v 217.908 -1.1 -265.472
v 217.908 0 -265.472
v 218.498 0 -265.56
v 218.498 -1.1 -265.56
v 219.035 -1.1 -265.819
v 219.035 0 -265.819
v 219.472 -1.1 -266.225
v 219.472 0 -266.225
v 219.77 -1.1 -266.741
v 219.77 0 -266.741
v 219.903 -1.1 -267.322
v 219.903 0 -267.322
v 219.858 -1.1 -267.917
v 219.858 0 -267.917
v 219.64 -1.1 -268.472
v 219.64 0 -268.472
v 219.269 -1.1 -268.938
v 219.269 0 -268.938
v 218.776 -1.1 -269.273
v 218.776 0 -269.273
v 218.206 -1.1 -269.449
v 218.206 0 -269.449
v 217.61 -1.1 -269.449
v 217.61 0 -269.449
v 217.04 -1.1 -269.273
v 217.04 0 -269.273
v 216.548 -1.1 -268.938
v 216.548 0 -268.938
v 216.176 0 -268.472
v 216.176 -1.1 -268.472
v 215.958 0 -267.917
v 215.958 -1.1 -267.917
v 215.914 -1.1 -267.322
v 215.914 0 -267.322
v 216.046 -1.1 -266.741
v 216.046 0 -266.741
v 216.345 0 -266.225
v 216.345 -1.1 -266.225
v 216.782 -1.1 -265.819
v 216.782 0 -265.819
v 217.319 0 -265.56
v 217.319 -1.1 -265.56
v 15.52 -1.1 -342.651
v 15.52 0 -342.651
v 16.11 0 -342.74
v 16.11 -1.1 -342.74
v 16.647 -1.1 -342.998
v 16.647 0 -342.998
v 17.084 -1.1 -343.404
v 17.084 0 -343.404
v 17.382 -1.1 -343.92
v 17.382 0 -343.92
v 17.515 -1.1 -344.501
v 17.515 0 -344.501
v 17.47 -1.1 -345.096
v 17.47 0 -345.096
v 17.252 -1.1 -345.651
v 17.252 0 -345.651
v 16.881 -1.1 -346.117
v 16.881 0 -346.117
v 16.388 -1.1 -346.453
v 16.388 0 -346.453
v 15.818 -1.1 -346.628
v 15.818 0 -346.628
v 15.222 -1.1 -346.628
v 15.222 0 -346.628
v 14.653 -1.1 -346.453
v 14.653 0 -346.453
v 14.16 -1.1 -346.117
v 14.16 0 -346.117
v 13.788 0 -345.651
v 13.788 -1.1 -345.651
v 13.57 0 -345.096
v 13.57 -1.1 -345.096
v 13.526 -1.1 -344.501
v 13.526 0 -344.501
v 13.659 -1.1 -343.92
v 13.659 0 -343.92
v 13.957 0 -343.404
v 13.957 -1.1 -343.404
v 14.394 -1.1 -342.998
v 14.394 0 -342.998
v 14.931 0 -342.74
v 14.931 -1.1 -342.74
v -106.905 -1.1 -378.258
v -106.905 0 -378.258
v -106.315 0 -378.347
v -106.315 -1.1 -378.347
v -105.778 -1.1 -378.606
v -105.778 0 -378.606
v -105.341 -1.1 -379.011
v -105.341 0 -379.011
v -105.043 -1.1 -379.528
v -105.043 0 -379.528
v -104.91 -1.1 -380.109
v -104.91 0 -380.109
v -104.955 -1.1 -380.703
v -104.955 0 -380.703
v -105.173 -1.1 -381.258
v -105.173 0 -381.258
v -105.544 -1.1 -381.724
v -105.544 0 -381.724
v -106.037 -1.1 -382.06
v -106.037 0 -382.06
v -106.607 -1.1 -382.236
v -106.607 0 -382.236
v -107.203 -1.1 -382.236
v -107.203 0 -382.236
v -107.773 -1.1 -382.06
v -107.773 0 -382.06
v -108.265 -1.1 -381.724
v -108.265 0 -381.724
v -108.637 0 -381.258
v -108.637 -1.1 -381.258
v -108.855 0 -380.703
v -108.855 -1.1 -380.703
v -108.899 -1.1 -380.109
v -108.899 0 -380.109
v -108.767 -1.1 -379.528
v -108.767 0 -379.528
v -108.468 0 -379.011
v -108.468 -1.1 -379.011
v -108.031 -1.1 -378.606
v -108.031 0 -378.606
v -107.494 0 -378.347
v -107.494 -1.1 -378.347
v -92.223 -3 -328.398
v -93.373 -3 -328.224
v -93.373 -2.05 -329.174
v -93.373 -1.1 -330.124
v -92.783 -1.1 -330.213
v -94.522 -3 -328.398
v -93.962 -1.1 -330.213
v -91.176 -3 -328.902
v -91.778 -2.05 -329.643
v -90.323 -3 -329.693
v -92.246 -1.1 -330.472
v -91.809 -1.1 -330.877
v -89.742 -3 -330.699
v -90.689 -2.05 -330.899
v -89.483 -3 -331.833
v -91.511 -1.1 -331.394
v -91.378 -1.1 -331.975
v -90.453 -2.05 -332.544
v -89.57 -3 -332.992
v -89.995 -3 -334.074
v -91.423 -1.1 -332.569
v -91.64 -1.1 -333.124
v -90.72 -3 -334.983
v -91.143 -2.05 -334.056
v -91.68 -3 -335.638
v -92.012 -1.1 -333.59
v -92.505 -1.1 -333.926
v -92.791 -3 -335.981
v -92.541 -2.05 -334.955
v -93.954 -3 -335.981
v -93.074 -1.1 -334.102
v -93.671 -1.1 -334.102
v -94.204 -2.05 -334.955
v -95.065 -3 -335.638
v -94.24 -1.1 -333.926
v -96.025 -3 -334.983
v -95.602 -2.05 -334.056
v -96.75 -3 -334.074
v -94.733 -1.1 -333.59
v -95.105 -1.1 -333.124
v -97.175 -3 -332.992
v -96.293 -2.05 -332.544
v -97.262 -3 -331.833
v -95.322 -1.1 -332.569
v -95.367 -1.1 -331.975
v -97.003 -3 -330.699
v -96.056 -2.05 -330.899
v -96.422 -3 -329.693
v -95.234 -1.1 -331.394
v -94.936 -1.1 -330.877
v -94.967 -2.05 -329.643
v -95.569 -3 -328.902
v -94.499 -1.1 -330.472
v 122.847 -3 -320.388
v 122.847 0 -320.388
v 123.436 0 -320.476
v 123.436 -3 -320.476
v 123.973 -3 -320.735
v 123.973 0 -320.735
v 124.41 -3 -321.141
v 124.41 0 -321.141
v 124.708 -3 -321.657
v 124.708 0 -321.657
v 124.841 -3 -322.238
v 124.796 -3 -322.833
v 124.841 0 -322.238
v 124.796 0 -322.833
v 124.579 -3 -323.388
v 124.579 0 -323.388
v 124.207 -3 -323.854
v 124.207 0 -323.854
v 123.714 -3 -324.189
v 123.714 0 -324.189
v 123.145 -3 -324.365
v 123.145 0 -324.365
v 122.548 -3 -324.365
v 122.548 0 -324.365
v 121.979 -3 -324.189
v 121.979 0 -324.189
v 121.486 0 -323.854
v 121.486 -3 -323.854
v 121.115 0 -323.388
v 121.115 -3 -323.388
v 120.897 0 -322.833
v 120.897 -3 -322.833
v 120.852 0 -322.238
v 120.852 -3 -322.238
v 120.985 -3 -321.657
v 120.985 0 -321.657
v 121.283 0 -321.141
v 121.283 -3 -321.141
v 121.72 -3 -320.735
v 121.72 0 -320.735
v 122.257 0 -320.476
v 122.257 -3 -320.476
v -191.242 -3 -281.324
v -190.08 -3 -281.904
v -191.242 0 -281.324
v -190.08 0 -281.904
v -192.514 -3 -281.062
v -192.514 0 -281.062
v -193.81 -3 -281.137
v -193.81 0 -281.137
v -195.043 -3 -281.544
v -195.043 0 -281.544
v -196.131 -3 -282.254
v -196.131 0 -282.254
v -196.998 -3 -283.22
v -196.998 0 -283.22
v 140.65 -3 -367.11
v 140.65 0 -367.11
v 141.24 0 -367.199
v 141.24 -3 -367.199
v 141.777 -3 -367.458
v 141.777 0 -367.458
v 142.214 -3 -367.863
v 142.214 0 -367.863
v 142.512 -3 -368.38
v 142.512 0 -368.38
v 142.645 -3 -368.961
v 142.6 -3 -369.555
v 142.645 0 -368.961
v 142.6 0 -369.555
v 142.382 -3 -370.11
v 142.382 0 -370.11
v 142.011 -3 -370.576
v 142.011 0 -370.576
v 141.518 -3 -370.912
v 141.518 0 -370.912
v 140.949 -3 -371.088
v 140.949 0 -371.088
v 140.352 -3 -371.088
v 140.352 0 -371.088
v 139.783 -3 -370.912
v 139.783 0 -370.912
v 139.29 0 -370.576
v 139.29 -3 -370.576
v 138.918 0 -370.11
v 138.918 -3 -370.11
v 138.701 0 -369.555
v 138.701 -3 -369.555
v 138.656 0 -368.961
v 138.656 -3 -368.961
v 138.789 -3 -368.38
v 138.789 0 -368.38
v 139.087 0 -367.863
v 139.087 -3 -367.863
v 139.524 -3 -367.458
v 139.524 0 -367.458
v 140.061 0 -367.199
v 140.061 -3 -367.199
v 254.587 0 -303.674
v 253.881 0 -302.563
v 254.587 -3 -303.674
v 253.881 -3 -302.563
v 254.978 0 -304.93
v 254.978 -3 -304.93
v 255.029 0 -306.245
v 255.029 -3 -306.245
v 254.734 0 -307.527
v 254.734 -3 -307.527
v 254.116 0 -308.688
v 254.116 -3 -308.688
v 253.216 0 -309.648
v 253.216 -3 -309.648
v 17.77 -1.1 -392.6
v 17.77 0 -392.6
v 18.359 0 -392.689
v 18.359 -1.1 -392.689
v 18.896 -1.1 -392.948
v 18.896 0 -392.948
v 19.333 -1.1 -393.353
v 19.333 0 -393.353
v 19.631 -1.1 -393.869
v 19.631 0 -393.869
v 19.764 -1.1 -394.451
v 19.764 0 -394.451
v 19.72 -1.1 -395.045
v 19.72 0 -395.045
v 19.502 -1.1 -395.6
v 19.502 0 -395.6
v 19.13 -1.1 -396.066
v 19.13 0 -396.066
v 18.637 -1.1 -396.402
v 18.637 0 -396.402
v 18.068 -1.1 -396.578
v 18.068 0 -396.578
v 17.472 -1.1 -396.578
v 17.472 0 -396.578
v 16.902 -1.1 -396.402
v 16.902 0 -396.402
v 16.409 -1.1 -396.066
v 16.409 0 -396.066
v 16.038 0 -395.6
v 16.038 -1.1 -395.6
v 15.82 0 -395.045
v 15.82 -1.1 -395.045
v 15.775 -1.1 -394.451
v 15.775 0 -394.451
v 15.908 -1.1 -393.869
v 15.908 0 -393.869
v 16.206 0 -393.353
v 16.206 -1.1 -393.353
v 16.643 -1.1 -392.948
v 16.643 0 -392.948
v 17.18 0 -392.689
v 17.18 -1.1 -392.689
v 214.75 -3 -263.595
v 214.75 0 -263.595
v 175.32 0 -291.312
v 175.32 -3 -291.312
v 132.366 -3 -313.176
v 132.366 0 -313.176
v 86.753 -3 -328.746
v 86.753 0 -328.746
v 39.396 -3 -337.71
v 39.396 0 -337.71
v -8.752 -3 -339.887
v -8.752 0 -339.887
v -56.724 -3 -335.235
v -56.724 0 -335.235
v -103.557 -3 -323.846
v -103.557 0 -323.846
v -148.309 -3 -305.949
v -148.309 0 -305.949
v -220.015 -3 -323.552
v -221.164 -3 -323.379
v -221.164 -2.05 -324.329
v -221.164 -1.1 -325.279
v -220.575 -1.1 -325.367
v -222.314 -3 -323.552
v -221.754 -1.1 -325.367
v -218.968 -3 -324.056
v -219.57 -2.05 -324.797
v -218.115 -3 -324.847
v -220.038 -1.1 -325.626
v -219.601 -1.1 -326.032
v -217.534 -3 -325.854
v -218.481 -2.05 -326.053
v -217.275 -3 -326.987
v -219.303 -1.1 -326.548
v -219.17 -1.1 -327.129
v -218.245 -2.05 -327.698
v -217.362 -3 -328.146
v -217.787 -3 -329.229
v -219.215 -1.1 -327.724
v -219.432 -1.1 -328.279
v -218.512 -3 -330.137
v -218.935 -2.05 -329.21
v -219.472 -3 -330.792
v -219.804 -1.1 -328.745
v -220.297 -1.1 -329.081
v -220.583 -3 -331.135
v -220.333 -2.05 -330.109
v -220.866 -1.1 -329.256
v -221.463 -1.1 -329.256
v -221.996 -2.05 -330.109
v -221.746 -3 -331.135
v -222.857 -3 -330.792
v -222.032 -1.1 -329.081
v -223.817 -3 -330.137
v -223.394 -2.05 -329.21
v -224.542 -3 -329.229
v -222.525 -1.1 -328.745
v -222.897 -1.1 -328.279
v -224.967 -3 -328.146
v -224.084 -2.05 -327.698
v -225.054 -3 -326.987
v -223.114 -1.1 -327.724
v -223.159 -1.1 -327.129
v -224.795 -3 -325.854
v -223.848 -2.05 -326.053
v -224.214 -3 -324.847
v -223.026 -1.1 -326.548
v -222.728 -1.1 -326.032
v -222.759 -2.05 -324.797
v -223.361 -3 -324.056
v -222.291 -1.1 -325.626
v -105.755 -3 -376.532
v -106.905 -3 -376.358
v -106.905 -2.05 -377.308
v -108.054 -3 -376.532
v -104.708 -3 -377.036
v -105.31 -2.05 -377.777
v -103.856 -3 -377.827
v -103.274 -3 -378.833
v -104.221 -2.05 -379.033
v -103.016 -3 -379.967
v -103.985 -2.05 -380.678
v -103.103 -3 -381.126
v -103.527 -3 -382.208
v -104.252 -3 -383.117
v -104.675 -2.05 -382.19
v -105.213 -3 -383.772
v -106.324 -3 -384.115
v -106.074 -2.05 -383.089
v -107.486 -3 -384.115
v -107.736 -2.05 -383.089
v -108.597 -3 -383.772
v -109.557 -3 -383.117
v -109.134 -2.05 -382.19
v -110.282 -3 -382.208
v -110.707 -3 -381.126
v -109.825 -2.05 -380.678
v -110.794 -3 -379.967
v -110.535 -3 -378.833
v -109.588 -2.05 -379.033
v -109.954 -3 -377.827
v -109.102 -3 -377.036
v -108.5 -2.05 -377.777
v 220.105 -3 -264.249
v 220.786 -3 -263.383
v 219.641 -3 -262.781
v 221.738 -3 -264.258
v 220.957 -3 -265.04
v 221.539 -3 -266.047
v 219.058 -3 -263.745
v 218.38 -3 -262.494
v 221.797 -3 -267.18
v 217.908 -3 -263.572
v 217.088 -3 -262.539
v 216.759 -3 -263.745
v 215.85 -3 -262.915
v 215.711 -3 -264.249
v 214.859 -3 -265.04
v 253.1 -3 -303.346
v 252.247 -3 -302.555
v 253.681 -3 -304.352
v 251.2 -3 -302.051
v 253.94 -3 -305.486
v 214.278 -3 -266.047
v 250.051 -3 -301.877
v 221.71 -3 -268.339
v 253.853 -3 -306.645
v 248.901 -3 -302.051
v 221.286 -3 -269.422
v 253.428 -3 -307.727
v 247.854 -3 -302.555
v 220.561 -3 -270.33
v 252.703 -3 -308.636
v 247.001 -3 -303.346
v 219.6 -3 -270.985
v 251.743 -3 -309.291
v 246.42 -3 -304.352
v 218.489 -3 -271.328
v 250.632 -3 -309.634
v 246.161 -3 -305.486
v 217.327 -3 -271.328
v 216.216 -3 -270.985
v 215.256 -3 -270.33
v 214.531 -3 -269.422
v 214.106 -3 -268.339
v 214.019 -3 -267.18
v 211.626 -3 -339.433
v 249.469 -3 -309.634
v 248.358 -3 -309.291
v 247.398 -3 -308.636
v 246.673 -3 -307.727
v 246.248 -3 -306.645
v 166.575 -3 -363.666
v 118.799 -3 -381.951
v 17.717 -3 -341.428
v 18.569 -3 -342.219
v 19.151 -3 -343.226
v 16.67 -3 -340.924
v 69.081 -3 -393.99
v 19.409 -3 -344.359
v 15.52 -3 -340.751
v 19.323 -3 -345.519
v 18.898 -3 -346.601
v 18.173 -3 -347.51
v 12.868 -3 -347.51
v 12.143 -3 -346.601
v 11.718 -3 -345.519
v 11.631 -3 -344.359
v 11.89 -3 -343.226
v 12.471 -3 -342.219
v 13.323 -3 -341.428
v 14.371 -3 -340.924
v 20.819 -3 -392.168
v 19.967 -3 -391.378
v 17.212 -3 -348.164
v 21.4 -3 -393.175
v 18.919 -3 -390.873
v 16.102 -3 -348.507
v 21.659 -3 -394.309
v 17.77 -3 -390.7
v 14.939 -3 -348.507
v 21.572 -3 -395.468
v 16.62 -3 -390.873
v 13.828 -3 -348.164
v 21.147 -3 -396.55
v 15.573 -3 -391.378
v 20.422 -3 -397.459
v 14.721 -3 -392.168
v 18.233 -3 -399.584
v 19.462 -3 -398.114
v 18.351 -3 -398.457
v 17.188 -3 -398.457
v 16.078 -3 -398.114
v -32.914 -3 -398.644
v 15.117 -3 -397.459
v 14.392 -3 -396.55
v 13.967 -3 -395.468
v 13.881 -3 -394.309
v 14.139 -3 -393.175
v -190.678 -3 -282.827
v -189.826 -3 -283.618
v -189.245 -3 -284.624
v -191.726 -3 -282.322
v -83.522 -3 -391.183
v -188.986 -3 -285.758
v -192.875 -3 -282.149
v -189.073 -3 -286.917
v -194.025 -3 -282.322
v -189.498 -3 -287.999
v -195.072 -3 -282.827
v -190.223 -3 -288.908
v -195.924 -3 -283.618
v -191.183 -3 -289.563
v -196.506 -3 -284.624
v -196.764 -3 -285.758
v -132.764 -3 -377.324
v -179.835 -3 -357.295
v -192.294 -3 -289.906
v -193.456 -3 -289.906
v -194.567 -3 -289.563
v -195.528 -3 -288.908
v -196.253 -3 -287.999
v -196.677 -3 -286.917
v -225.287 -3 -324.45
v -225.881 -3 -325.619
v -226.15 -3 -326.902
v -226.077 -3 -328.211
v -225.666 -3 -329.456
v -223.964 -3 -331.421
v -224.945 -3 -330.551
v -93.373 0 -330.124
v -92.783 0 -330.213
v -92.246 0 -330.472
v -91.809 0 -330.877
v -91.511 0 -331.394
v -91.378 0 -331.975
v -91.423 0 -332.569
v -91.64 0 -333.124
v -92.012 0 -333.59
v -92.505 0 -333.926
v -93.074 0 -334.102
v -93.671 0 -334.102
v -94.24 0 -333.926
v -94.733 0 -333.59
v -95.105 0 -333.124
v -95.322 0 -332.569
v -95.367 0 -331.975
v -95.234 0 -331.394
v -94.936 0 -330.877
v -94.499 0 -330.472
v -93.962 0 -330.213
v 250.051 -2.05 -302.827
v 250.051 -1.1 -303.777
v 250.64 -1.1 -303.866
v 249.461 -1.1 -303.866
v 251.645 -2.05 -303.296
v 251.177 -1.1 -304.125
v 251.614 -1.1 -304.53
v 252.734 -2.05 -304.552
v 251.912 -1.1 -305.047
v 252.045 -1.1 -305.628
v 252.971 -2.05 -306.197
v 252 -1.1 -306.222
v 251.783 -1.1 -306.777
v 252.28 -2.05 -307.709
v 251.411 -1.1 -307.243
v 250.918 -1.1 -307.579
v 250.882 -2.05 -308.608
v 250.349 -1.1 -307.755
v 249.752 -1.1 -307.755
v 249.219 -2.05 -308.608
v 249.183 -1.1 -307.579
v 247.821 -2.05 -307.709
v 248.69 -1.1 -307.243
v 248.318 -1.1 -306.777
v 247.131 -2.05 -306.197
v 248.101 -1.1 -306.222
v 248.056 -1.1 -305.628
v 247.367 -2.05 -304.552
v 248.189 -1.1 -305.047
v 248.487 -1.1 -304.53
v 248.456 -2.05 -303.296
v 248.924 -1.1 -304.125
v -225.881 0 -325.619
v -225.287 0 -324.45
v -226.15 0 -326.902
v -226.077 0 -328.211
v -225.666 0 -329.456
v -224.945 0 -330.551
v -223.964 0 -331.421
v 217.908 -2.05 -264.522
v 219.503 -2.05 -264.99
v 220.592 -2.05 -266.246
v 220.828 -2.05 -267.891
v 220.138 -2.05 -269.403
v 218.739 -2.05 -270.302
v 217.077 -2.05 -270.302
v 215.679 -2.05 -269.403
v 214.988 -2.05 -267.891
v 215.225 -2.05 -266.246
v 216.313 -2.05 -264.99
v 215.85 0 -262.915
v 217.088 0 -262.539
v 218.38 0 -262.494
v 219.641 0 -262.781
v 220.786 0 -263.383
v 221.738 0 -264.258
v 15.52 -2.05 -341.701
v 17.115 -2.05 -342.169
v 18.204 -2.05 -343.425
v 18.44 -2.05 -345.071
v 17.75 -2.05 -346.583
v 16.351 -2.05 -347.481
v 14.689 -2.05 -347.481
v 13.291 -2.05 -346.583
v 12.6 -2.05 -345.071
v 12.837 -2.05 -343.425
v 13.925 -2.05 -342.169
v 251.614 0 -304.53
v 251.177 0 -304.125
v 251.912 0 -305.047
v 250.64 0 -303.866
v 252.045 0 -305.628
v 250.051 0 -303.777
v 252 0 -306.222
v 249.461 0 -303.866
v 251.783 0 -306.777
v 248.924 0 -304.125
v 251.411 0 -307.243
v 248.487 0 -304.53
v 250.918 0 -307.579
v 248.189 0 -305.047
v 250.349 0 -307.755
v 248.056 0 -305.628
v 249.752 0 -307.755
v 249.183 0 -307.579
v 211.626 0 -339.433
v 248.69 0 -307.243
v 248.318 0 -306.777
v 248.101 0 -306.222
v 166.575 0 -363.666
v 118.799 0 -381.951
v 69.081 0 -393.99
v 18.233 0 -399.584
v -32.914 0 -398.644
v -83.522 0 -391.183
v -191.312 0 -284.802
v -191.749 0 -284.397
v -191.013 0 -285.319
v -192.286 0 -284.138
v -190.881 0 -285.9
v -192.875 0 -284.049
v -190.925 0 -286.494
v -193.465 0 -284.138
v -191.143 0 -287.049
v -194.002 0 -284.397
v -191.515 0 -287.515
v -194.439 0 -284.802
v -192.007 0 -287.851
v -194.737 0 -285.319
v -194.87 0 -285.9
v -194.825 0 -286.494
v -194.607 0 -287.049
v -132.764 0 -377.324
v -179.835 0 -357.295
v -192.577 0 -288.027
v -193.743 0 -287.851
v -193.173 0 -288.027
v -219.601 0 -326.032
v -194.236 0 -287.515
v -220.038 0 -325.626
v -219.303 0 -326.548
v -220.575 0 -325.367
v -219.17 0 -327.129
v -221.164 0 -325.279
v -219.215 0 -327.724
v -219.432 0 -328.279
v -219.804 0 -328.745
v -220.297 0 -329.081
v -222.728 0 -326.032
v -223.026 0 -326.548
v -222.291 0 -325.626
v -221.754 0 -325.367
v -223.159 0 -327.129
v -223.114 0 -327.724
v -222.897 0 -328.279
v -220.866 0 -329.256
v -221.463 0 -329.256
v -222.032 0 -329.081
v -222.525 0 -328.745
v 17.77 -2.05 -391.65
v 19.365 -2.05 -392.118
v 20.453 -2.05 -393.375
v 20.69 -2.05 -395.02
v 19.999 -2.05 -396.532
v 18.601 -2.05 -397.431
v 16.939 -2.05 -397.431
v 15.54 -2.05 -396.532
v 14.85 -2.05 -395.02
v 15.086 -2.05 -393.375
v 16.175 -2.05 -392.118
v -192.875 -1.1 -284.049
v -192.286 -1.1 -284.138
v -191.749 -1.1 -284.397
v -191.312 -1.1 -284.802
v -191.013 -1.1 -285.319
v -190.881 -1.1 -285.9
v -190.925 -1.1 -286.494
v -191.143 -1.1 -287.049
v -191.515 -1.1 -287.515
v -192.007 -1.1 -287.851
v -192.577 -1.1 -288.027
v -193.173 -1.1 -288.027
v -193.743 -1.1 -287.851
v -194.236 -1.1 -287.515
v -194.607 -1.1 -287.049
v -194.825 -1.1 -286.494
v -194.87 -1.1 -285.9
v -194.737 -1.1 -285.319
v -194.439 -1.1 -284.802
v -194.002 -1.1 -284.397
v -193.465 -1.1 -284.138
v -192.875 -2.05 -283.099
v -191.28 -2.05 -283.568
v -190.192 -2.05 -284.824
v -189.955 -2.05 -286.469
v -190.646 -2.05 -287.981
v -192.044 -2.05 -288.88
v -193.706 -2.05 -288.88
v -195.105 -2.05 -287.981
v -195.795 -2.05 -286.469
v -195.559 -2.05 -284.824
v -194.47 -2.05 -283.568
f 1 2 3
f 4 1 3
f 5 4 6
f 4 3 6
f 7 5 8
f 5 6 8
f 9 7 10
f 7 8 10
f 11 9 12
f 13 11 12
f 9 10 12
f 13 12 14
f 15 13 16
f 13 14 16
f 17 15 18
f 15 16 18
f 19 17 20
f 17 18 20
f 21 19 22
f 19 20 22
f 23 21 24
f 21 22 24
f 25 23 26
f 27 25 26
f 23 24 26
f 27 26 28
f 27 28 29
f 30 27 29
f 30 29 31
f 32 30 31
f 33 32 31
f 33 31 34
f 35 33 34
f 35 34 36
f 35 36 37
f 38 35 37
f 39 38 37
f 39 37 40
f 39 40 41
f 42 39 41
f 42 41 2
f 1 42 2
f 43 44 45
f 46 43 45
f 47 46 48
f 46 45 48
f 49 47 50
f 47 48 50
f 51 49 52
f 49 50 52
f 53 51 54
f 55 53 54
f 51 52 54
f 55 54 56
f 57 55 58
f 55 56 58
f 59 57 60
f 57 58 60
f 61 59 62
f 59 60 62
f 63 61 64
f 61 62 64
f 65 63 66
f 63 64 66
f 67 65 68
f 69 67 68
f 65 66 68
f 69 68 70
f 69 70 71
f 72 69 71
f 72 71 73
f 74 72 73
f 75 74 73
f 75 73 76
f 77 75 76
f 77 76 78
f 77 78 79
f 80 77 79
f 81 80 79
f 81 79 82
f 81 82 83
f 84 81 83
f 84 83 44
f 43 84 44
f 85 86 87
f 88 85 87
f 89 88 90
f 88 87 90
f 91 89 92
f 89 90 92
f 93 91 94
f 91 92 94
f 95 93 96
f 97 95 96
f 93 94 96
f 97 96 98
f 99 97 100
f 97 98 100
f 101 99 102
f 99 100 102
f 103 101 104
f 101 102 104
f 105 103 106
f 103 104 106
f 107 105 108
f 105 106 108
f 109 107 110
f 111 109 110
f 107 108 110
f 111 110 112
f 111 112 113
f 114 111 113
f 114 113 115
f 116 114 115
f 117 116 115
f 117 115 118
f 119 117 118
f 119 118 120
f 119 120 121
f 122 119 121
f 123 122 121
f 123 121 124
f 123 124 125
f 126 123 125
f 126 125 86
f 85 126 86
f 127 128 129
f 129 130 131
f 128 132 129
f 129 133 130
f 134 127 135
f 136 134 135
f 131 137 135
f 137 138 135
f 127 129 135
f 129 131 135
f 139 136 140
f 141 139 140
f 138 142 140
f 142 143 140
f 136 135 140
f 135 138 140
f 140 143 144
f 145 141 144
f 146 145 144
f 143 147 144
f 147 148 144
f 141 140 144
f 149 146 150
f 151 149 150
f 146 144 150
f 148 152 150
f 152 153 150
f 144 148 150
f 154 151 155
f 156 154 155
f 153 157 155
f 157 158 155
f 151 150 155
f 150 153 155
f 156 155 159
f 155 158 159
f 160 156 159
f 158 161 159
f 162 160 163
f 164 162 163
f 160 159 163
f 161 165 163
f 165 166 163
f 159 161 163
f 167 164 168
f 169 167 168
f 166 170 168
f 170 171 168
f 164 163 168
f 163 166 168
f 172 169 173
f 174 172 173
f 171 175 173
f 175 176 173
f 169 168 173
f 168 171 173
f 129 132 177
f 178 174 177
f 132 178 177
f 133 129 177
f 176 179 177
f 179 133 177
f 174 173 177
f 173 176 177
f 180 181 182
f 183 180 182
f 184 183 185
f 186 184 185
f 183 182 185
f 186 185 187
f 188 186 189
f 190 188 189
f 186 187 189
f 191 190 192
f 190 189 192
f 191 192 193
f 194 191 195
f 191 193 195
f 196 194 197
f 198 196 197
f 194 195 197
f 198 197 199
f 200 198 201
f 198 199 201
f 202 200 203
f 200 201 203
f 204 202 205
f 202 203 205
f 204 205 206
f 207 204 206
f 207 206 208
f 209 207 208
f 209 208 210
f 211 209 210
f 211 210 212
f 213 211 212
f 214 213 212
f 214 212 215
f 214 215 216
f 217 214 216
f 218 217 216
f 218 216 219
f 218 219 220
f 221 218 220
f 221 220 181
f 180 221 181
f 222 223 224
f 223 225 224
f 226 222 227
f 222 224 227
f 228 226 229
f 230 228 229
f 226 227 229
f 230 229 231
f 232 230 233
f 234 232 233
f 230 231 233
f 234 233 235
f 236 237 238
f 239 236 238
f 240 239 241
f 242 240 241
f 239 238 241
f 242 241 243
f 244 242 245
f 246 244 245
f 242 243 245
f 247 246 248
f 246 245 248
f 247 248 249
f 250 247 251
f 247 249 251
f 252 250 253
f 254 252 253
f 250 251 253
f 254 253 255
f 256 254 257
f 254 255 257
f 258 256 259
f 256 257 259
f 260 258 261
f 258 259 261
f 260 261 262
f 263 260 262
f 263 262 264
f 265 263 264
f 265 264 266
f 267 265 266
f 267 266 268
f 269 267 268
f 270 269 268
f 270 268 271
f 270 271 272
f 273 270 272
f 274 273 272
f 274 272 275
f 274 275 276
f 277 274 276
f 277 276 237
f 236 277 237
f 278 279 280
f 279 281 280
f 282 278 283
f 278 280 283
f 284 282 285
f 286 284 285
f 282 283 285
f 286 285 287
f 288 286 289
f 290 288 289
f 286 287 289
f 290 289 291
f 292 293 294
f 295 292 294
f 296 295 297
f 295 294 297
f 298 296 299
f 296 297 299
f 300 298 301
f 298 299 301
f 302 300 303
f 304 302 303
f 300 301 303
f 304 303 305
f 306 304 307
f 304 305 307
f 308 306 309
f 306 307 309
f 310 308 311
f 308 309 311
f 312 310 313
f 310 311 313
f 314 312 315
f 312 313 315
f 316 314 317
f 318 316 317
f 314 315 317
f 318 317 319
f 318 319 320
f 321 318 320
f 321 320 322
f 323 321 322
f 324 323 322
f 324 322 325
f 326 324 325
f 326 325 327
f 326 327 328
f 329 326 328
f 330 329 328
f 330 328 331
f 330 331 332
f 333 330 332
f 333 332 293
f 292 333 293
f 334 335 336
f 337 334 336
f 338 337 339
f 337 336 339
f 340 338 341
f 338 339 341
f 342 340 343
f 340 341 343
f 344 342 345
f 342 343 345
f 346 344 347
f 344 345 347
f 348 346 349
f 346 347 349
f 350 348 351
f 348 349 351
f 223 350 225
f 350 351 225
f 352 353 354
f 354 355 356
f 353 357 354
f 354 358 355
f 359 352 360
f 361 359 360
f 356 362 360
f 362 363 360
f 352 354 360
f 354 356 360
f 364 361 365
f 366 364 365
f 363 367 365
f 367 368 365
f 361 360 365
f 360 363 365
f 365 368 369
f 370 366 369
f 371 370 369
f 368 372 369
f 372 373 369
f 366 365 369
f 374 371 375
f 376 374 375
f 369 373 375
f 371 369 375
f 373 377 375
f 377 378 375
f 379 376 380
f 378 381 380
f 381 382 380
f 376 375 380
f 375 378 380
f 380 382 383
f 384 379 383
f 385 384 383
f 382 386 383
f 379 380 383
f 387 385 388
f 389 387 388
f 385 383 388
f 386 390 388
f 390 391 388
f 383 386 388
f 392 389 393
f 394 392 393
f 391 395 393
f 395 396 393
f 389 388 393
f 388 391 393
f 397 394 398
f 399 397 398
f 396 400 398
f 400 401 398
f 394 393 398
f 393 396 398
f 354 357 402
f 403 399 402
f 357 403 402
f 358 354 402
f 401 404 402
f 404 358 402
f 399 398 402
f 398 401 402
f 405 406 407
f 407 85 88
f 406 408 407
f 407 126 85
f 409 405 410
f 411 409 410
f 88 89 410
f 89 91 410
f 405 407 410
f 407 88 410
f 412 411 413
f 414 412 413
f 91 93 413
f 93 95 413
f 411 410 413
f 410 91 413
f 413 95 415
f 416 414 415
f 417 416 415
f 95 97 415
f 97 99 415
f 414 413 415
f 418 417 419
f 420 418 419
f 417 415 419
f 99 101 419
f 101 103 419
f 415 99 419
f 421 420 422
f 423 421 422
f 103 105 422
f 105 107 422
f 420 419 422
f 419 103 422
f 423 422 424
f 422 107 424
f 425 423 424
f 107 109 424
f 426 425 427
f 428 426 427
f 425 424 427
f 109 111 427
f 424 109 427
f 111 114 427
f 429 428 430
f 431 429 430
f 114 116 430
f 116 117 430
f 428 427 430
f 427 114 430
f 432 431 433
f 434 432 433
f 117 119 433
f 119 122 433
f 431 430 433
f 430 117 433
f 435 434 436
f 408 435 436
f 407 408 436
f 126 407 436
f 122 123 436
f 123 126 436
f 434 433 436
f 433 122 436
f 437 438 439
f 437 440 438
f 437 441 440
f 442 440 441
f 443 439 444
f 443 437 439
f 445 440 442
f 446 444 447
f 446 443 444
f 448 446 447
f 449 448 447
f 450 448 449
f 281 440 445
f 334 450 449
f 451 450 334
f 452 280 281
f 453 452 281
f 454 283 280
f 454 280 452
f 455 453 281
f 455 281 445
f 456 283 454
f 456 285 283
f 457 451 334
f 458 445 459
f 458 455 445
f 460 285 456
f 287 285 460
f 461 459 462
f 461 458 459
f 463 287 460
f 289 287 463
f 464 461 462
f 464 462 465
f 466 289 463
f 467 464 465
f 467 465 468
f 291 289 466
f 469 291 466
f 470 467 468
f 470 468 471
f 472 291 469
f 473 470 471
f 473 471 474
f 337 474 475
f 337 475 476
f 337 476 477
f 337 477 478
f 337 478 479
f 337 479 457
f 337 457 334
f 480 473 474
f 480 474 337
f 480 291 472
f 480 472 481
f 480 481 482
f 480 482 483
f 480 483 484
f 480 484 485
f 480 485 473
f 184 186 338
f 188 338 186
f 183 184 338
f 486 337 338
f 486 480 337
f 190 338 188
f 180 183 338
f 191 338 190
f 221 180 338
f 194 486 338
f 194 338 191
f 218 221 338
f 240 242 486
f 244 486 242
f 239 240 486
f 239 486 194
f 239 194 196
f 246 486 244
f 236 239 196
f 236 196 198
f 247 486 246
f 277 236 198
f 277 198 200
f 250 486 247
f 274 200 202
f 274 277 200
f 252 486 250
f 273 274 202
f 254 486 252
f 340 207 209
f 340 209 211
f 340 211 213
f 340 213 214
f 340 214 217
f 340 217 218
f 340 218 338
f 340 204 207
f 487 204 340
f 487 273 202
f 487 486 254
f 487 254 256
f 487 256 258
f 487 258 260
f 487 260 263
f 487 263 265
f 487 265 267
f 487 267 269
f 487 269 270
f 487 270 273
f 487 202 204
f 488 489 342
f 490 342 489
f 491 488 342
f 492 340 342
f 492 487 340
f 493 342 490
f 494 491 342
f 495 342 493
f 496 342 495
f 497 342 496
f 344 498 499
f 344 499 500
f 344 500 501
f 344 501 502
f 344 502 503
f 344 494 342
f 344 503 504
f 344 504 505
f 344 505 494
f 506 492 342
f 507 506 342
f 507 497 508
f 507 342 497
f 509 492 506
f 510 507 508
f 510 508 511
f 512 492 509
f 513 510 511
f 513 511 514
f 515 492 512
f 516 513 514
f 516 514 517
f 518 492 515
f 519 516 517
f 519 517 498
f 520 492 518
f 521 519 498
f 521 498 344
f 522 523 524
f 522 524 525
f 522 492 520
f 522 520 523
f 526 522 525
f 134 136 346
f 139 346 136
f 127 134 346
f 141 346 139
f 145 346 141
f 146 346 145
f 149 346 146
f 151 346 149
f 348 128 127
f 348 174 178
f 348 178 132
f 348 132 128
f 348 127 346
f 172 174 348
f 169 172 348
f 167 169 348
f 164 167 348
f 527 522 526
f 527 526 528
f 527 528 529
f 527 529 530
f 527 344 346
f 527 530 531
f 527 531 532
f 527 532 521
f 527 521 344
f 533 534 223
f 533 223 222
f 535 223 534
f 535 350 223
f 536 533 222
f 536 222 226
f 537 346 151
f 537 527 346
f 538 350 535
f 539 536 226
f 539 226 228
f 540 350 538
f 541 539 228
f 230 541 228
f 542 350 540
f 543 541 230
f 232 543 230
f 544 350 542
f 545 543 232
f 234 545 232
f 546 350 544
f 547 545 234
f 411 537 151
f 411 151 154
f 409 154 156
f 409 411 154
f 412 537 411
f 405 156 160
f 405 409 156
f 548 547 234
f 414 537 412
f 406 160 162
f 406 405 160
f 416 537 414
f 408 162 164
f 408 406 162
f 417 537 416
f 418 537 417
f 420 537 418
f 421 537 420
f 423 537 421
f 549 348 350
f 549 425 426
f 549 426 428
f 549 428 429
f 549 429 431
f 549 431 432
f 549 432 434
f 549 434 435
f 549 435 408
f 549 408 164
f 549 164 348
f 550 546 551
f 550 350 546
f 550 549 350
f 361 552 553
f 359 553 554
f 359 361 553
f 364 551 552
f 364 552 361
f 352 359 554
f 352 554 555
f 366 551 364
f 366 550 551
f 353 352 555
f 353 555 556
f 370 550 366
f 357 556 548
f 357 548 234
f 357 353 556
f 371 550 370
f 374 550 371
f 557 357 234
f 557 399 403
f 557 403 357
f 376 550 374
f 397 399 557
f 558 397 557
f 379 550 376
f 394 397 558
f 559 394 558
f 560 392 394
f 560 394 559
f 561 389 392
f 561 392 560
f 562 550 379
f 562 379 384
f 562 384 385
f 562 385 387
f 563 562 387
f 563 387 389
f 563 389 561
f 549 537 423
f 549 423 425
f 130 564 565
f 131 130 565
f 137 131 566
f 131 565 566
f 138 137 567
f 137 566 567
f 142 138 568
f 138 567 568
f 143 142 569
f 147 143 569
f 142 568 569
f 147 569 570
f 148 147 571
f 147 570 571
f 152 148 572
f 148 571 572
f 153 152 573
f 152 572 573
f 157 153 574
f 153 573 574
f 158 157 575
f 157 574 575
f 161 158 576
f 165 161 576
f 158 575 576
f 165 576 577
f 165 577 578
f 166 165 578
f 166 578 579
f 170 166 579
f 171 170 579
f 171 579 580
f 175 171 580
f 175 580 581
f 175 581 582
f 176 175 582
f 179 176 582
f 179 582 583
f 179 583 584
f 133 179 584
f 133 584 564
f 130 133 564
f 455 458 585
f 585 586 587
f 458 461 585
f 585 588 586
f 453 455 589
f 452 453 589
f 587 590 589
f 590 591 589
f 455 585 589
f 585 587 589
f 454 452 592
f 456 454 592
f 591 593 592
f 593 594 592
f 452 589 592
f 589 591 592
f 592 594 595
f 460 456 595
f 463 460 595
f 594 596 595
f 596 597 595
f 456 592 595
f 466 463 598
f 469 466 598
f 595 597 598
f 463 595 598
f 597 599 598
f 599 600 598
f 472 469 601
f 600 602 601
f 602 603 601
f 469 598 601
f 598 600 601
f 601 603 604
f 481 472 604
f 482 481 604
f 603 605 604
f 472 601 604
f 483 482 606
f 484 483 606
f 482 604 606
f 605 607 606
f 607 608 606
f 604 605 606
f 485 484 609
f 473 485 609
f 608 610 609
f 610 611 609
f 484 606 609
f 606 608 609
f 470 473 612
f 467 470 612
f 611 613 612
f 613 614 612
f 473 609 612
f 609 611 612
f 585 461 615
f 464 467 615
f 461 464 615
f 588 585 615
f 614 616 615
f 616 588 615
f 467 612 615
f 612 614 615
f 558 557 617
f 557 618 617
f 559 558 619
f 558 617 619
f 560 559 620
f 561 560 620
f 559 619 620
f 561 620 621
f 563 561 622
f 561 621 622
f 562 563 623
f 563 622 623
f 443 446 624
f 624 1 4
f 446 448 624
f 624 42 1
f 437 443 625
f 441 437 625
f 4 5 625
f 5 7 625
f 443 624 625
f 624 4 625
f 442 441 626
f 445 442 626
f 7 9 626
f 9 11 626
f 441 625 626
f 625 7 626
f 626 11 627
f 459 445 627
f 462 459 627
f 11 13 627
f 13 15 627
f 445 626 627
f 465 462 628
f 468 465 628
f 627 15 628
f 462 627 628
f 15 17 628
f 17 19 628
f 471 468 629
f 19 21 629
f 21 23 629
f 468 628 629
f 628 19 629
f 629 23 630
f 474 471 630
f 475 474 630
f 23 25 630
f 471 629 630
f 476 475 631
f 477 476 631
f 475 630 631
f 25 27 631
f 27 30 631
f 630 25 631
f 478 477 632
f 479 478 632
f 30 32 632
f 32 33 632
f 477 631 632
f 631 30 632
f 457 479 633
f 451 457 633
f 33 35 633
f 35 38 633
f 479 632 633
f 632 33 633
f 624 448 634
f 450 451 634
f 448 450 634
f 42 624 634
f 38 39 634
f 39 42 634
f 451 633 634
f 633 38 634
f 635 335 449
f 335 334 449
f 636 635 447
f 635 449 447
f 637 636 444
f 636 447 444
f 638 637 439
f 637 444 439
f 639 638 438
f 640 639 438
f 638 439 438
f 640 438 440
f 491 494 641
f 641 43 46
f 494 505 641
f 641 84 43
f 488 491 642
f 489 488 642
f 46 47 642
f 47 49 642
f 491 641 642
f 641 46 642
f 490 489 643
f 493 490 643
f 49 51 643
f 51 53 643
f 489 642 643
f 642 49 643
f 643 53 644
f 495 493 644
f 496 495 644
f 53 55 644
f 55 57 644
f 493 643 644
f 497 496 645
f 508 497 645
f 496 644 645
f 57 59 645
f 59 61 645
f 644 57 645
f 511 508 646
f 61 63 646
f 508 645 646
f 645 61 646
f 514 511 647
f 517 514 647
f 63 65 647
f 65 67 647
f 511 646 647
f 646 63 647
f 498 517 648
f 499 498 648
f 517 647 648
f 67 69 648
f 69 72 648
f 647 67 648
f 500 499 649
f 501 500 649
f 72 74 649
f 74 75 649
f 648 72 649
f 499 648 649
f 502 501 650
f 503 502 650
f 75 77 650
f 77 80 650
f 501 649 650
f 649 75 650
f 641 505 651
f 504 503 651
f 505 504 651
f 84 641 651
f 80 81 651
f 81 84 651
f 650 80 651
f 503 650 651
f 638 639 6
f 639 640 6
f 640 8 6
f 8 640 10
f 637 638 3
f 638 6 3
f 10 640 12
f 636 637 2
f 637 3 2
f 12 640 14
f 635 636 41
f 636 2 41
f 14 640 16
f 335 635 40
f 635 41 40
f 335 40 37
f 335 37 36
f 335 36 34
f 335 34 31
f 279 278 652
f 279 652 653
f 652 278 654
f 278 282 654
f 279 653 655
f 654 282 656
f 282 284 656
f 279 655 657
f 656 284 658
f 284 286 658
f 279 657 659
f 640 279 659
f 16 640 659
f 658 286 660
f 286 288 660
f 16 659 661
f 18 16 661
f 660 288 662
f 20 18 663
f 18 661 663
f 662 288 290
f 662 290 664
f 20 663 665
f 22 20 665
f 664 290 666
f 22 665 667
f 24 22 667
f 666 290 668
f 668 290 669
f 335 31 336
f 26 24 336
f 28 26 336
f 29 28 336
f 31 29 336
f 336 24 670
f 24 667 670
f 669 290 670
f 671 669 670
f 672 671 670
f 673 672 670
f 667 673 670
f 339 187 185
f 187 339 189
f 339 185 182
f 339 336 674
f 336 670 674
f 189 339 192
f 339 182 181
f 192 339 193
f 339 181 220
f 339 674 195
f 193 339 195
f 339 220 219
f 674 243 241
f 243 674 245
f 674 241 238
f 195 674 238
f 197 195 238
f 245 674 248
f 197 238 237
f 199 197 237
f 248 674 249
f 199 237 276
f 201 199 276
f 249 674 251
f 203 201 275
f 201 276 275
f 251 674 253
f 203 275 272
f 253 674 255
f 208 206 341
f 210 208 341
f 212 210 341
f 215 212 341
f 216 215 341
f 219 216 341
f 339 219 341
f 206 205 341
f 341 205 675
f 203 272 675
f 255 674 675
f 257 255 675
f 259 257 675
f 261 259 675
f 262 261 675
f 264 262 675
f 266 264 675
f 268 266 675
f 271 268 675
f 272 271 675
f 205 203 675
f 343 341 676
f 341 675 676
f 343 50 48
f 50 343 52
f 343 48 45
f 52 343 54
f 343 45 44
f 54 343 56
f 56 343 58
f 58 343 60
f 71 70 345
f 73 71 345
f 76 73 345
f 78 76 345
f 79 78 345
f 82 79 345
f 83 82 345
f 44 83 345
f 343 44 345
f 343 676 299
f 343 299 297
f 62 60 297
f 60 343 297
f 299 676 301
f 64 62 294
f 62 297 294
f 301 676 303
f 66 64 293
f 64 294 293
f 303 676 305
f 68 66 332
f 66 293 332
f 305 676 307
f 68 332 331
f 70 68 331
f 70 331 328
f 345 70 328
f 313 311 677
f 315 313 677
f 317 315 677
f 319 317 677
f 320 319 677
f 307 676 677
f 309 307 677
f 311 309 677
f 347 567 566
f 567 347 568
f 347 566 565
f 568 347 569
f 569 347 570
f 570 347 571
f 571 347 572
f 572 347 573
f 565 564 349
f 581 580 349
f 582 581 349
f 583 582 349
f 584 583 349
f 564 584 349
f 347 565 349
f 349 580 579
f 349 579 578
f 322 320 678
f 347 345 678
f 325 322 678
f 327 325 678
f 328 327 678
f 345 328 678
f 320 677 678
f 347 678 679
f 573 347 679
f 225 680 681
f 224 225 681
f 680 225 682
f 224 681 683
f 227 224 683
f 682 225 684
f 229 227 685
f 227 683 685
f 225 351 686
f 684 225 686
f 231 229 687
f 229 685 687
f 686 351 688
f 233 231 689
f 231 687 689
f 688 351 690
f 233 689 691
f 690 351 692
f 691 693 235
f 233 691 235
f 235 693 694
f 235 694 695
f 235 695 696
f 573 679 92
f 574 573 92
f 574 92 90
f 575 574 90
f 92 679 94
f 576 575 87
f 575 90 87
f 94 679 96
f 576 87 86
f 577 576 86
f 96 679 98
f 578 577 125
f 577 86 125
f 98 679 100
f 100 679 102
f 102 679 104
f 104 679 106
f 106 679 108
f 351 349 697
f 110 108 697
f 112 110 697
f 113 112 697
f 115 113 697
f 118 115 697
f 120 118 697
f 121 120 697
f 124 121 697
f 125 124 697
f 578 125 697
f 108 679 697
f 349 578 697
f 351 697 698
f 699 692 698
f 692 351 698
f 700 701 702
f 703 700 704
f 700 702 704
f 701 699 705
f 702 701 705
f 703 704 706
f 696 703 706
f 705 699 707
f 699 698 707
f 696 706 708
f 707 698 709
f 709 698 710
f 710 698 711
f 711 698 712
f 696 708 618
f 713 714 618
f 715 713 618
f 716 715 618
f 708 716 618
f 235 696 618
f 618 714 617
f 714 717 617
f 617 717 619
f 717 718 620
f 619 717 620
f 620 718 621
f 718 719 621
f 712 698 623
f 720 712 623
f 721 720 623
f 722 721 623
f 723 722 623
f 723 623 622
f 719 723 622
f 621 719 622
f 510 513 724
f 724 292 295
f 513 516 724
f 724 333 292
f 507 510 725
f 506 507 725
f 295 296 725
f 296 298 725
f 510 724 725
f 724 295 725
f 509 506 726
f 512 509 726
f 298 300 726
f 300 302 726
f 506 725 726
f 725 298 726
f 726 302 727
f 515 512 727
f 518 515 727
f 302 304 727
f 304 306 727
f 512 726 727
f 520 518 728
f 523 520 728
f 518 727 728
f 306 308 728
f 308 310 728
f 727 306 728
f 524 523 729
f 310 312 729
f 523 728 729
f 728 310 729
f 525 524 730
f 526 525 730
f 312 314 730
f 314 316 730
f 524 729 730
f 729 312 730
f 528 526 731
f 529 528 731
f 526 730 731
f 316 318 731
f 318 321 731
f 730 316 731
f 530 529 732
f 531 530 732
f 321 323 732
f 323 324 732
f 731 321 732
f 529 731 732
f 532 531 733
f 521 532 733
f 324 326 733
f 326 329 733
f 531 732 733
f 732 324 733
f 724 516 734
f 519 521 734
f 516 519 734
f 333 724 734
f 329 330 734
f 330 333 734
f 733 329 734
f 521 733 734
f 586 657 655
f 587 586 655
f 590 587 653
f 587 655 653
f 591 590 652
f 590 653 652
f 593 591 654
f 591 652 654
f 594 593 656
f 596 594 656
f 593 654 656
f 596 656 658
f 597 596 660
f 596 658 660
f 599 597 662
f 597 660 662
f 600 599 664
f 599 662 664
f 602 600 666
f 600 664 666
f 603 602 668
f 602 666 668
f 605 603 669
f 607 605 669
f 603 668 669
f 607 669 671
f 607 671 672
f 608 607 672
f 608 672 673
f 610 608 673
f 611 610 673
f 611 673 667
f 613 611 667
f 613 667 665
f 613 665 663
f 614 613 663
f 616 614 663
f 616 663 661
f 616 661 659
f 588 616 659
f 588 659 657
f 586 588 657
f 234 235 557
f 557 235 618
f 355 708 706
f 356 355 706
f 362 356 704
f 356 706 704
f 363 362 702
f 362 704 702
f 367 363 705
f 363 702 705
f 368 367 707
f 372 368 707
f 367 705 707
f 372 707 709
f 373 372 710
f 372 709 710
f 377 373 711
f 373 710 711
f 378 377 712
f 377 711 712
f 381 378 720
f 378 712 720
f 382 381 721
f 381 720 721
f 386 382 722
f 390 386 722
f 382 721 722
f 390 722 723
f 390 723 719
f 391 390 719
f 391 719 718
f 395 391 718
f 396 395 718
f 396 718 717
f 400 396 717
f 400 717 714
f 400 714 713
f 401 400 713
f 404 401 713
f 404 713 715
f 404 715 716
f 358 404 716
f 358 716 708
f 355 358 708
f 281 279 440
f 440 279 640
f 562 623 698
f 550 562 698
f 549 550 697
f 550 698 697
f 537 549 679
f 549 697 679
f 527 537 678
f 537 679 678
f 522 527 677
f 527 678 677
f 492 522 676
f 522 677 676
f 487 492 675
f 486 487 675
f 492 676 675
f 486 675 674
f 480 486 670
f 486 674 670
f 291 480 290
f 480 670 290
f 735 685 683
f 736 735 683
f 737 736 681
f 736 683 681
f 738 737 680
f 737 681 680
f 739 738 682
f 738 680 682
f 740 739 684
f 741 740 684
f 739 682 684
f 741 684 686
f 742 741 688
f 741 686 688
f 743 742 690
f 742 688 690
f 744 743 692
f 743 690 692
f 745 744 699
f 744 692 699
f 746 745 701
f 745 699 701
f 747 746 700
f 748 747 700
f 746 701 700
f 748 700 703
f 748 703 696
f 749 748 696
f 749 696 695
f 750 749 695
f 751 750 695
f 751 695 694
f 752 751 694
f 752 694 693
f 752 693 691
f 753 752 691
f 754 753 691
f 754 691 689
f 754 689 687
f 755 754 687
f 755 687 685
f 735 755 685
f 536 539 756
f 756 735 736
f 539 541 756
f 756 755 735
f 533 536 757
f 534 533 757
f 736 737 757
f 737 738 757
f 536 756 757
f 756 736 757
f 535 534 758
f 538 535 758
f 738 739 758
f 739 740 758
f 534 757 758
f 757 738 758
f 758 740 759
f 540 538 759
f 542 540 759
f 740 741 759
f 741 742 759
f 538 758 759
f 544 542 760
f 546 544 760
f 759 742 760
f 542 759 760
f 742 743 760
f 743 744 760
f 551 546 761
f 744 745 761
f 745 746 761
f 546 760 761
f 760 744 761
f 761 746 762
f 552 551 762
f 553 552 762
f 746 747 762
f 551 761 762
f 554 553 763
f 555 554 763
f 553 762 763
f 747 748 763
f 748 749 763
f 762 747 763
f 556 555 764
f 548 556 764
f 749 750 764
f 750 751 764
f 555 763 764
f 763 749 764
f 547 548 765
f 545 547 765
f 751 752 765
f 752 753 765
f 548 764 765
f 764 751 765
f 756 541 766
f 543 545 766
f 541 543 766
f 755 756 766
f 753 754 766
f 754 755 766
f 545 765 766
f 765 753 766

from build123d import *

# Parameters (mm, degrees)
SM_BASE_FLANGE_1_DEPTH = 3
CUT_EXTRUDE_1_DEPTH    = 10
FILLET_1_R             = 5
FILLET_2_R             = 5
SKETCH_3_R             = 2
CUT_EXTRUDE_2_DEPTH    = 10
SKETCH_5_R             = 2
CUT_EXTRUDE_4_DEPTH    = 10
CHAMFER_1_SIZE         = 1.9
SKETCH_6_R             = 2
CUT_EXTRUDE_5_DEPTH    = 10


# Sheet-metal steps are written as plain solids
with BuildPart() as part:
    # Sketch 1 → Базовая кромка1 (new body)
    with BuildSketch(Plane(origin=(0, 0, 0), x_dir=(1, 0, 0), z_dir=(0, 1, 0))):
        with BuildLine():
            Line((-218.547787293, 260.45511066), (-257.115043875, 306.417777248))
            ThreePointArc((-257.115043875, 306.417777248), (0, 400), (257.115043875, 306.417777248))
            Line((257.115043875, 306.417777248), (218.547787293, 260.45511066))
            ThreePointArc((218.547787293, 260.45511066), (0, 340), (-218.547787293, 260.45511066))
        make_face()
    extrude(amount=-SM_BASE_FLANGE_1_DEPTH)

    # Эскиз2 → Вырез-Вытянуть1 (cut)
    with BuildSketch(Plane(origin=(0, 0, 0), x_dir=(1, 0, 0), z_dir=(0, 1, 0))):
        Polygon((-185.870849123, 267.003439601), (-232.668944094, 335.207852497), (-262.024399195, 311.215696318), (-219.773904278, 254.720487984), align=None)
    extrude(amount=-CUT_EXTRUDE_1_DEPTH, mode=Mode.SUBTRACT)

    # Скругление1
    fillet_1_edges = [part.edges().sort_by_distance(p)[0] for p in [
        (-194.171567718, -1.5, -279.101061069),
        (-228.118354699, -1.5, -328.575738985),
    ]]
    fillet(fillet_1_edges, radius=FILLET_1_R)

    # Скругление2
    fillet_2_edges = [part.edges().sort_by_distance(p)[0] for p in [
        (257.115043875, -1.5, -306.417777248),
        (218.547787293, -1.5, -260.45511066),
    ]]
    fillet(fillet_2_edges, radius=FILLET_2_R)

    # Эскиз3 → Вырез-Вытянуть2 (cut)
    with BuildSketch(Plane(origin=(0, 0, 0), x_dir=(1, 0, 0), z_dir=(0, 1, 0))):
        with Locations(Location((-221.164496487, 327.278574755, 0), (0, 0, 270))):
            Circle(SKETCH_3_R)
        with Locations(Location((-192.875196767, 286.049223862, 0), (0, 0, 270))):
            Circle(SKETCH_3_R)
        with Locations(Location((217.908212497, 267.471514233, 0), (0, 0, 270))):
            Circle(SKETCH_3_R)
        with Locations(Location((250.050541416, 305.777250197, 0), (0, 0, 270))):
            Circle(SKETCH_3_R)
    extrude(amount=-CUT_EXTRUDE_2_DEPTH, mode=Mode.SUBTRACT)

    # Эскиз5 → Вырез-Вытянуть4 (cut)
    with BuildSketch(Plane(origin=(0, 0, 0), x_dir=(1, 0, 0), z_dir=(0, 1, 0))):
        with Locations(Location((15.5203425, 344.65072025, 0), (0, 0, 270))):
            Circle(SKETCH_5_R)
        with Locations(Location((17.7696675, 394.600099996, 0), (0, 0, 270))):
            Circle(SKETCH_5_R)
        with Locations(Location((-106.904799365, 380.258285738, 0), (0, 0, 270))):
            Circle(SKETCH_5_R)
        with Locations(Location((-93.372546281, 332.124325518, 0), (0, 0, 270))):
            Circle(SKETCH_5_R)
    extrude(amount=-CUT_EXTRUDE_4_DEPTH, mode=Mode.SUBTRACT)

    # Фаска1
    chamfer_1_edges = [part.edges().sort_by_distance(p)[0] for p in [
        (-93.372546281, -3, -334.124325518),
        (-221.164496487, -3, -329.278574755),
        (-192.875196767, -3, -288.049223862),
        (217.908212497, -3, -269.471514233),
        (250.050541416, -3, -307.777250197),
        (15.5203425, -3, -346.65072025),
        (17.7696675, -3, -396.600099996),
        (-106.904799365, -3, -382.258285738),
    ]]
    chamfer(chamfer_1_edges, length=CHAMFER_1_SIZE)

    # Эскиз6 → Вырез-Вытянуть5 (cut)
    with BuildSketch(Plane(origin=(0, 0, 0), x_dir=(1, 0, 0), z_dir=(0, 1, 0))):
        with Locations(Location((140.650436017, 369.110355921, 0), (0, 0, 270))):
            Circle(SKETCH_6_R)
        with Locations(Location((122.846583356, 322.387526058, 0), (0, 0, 270))):
            Circle(SKETCH_6_R)
    extrude(amount=-CUT_EXTRUDE_5_DEPTH, mode=Mode.SUBTRACT)


solid = part.part
